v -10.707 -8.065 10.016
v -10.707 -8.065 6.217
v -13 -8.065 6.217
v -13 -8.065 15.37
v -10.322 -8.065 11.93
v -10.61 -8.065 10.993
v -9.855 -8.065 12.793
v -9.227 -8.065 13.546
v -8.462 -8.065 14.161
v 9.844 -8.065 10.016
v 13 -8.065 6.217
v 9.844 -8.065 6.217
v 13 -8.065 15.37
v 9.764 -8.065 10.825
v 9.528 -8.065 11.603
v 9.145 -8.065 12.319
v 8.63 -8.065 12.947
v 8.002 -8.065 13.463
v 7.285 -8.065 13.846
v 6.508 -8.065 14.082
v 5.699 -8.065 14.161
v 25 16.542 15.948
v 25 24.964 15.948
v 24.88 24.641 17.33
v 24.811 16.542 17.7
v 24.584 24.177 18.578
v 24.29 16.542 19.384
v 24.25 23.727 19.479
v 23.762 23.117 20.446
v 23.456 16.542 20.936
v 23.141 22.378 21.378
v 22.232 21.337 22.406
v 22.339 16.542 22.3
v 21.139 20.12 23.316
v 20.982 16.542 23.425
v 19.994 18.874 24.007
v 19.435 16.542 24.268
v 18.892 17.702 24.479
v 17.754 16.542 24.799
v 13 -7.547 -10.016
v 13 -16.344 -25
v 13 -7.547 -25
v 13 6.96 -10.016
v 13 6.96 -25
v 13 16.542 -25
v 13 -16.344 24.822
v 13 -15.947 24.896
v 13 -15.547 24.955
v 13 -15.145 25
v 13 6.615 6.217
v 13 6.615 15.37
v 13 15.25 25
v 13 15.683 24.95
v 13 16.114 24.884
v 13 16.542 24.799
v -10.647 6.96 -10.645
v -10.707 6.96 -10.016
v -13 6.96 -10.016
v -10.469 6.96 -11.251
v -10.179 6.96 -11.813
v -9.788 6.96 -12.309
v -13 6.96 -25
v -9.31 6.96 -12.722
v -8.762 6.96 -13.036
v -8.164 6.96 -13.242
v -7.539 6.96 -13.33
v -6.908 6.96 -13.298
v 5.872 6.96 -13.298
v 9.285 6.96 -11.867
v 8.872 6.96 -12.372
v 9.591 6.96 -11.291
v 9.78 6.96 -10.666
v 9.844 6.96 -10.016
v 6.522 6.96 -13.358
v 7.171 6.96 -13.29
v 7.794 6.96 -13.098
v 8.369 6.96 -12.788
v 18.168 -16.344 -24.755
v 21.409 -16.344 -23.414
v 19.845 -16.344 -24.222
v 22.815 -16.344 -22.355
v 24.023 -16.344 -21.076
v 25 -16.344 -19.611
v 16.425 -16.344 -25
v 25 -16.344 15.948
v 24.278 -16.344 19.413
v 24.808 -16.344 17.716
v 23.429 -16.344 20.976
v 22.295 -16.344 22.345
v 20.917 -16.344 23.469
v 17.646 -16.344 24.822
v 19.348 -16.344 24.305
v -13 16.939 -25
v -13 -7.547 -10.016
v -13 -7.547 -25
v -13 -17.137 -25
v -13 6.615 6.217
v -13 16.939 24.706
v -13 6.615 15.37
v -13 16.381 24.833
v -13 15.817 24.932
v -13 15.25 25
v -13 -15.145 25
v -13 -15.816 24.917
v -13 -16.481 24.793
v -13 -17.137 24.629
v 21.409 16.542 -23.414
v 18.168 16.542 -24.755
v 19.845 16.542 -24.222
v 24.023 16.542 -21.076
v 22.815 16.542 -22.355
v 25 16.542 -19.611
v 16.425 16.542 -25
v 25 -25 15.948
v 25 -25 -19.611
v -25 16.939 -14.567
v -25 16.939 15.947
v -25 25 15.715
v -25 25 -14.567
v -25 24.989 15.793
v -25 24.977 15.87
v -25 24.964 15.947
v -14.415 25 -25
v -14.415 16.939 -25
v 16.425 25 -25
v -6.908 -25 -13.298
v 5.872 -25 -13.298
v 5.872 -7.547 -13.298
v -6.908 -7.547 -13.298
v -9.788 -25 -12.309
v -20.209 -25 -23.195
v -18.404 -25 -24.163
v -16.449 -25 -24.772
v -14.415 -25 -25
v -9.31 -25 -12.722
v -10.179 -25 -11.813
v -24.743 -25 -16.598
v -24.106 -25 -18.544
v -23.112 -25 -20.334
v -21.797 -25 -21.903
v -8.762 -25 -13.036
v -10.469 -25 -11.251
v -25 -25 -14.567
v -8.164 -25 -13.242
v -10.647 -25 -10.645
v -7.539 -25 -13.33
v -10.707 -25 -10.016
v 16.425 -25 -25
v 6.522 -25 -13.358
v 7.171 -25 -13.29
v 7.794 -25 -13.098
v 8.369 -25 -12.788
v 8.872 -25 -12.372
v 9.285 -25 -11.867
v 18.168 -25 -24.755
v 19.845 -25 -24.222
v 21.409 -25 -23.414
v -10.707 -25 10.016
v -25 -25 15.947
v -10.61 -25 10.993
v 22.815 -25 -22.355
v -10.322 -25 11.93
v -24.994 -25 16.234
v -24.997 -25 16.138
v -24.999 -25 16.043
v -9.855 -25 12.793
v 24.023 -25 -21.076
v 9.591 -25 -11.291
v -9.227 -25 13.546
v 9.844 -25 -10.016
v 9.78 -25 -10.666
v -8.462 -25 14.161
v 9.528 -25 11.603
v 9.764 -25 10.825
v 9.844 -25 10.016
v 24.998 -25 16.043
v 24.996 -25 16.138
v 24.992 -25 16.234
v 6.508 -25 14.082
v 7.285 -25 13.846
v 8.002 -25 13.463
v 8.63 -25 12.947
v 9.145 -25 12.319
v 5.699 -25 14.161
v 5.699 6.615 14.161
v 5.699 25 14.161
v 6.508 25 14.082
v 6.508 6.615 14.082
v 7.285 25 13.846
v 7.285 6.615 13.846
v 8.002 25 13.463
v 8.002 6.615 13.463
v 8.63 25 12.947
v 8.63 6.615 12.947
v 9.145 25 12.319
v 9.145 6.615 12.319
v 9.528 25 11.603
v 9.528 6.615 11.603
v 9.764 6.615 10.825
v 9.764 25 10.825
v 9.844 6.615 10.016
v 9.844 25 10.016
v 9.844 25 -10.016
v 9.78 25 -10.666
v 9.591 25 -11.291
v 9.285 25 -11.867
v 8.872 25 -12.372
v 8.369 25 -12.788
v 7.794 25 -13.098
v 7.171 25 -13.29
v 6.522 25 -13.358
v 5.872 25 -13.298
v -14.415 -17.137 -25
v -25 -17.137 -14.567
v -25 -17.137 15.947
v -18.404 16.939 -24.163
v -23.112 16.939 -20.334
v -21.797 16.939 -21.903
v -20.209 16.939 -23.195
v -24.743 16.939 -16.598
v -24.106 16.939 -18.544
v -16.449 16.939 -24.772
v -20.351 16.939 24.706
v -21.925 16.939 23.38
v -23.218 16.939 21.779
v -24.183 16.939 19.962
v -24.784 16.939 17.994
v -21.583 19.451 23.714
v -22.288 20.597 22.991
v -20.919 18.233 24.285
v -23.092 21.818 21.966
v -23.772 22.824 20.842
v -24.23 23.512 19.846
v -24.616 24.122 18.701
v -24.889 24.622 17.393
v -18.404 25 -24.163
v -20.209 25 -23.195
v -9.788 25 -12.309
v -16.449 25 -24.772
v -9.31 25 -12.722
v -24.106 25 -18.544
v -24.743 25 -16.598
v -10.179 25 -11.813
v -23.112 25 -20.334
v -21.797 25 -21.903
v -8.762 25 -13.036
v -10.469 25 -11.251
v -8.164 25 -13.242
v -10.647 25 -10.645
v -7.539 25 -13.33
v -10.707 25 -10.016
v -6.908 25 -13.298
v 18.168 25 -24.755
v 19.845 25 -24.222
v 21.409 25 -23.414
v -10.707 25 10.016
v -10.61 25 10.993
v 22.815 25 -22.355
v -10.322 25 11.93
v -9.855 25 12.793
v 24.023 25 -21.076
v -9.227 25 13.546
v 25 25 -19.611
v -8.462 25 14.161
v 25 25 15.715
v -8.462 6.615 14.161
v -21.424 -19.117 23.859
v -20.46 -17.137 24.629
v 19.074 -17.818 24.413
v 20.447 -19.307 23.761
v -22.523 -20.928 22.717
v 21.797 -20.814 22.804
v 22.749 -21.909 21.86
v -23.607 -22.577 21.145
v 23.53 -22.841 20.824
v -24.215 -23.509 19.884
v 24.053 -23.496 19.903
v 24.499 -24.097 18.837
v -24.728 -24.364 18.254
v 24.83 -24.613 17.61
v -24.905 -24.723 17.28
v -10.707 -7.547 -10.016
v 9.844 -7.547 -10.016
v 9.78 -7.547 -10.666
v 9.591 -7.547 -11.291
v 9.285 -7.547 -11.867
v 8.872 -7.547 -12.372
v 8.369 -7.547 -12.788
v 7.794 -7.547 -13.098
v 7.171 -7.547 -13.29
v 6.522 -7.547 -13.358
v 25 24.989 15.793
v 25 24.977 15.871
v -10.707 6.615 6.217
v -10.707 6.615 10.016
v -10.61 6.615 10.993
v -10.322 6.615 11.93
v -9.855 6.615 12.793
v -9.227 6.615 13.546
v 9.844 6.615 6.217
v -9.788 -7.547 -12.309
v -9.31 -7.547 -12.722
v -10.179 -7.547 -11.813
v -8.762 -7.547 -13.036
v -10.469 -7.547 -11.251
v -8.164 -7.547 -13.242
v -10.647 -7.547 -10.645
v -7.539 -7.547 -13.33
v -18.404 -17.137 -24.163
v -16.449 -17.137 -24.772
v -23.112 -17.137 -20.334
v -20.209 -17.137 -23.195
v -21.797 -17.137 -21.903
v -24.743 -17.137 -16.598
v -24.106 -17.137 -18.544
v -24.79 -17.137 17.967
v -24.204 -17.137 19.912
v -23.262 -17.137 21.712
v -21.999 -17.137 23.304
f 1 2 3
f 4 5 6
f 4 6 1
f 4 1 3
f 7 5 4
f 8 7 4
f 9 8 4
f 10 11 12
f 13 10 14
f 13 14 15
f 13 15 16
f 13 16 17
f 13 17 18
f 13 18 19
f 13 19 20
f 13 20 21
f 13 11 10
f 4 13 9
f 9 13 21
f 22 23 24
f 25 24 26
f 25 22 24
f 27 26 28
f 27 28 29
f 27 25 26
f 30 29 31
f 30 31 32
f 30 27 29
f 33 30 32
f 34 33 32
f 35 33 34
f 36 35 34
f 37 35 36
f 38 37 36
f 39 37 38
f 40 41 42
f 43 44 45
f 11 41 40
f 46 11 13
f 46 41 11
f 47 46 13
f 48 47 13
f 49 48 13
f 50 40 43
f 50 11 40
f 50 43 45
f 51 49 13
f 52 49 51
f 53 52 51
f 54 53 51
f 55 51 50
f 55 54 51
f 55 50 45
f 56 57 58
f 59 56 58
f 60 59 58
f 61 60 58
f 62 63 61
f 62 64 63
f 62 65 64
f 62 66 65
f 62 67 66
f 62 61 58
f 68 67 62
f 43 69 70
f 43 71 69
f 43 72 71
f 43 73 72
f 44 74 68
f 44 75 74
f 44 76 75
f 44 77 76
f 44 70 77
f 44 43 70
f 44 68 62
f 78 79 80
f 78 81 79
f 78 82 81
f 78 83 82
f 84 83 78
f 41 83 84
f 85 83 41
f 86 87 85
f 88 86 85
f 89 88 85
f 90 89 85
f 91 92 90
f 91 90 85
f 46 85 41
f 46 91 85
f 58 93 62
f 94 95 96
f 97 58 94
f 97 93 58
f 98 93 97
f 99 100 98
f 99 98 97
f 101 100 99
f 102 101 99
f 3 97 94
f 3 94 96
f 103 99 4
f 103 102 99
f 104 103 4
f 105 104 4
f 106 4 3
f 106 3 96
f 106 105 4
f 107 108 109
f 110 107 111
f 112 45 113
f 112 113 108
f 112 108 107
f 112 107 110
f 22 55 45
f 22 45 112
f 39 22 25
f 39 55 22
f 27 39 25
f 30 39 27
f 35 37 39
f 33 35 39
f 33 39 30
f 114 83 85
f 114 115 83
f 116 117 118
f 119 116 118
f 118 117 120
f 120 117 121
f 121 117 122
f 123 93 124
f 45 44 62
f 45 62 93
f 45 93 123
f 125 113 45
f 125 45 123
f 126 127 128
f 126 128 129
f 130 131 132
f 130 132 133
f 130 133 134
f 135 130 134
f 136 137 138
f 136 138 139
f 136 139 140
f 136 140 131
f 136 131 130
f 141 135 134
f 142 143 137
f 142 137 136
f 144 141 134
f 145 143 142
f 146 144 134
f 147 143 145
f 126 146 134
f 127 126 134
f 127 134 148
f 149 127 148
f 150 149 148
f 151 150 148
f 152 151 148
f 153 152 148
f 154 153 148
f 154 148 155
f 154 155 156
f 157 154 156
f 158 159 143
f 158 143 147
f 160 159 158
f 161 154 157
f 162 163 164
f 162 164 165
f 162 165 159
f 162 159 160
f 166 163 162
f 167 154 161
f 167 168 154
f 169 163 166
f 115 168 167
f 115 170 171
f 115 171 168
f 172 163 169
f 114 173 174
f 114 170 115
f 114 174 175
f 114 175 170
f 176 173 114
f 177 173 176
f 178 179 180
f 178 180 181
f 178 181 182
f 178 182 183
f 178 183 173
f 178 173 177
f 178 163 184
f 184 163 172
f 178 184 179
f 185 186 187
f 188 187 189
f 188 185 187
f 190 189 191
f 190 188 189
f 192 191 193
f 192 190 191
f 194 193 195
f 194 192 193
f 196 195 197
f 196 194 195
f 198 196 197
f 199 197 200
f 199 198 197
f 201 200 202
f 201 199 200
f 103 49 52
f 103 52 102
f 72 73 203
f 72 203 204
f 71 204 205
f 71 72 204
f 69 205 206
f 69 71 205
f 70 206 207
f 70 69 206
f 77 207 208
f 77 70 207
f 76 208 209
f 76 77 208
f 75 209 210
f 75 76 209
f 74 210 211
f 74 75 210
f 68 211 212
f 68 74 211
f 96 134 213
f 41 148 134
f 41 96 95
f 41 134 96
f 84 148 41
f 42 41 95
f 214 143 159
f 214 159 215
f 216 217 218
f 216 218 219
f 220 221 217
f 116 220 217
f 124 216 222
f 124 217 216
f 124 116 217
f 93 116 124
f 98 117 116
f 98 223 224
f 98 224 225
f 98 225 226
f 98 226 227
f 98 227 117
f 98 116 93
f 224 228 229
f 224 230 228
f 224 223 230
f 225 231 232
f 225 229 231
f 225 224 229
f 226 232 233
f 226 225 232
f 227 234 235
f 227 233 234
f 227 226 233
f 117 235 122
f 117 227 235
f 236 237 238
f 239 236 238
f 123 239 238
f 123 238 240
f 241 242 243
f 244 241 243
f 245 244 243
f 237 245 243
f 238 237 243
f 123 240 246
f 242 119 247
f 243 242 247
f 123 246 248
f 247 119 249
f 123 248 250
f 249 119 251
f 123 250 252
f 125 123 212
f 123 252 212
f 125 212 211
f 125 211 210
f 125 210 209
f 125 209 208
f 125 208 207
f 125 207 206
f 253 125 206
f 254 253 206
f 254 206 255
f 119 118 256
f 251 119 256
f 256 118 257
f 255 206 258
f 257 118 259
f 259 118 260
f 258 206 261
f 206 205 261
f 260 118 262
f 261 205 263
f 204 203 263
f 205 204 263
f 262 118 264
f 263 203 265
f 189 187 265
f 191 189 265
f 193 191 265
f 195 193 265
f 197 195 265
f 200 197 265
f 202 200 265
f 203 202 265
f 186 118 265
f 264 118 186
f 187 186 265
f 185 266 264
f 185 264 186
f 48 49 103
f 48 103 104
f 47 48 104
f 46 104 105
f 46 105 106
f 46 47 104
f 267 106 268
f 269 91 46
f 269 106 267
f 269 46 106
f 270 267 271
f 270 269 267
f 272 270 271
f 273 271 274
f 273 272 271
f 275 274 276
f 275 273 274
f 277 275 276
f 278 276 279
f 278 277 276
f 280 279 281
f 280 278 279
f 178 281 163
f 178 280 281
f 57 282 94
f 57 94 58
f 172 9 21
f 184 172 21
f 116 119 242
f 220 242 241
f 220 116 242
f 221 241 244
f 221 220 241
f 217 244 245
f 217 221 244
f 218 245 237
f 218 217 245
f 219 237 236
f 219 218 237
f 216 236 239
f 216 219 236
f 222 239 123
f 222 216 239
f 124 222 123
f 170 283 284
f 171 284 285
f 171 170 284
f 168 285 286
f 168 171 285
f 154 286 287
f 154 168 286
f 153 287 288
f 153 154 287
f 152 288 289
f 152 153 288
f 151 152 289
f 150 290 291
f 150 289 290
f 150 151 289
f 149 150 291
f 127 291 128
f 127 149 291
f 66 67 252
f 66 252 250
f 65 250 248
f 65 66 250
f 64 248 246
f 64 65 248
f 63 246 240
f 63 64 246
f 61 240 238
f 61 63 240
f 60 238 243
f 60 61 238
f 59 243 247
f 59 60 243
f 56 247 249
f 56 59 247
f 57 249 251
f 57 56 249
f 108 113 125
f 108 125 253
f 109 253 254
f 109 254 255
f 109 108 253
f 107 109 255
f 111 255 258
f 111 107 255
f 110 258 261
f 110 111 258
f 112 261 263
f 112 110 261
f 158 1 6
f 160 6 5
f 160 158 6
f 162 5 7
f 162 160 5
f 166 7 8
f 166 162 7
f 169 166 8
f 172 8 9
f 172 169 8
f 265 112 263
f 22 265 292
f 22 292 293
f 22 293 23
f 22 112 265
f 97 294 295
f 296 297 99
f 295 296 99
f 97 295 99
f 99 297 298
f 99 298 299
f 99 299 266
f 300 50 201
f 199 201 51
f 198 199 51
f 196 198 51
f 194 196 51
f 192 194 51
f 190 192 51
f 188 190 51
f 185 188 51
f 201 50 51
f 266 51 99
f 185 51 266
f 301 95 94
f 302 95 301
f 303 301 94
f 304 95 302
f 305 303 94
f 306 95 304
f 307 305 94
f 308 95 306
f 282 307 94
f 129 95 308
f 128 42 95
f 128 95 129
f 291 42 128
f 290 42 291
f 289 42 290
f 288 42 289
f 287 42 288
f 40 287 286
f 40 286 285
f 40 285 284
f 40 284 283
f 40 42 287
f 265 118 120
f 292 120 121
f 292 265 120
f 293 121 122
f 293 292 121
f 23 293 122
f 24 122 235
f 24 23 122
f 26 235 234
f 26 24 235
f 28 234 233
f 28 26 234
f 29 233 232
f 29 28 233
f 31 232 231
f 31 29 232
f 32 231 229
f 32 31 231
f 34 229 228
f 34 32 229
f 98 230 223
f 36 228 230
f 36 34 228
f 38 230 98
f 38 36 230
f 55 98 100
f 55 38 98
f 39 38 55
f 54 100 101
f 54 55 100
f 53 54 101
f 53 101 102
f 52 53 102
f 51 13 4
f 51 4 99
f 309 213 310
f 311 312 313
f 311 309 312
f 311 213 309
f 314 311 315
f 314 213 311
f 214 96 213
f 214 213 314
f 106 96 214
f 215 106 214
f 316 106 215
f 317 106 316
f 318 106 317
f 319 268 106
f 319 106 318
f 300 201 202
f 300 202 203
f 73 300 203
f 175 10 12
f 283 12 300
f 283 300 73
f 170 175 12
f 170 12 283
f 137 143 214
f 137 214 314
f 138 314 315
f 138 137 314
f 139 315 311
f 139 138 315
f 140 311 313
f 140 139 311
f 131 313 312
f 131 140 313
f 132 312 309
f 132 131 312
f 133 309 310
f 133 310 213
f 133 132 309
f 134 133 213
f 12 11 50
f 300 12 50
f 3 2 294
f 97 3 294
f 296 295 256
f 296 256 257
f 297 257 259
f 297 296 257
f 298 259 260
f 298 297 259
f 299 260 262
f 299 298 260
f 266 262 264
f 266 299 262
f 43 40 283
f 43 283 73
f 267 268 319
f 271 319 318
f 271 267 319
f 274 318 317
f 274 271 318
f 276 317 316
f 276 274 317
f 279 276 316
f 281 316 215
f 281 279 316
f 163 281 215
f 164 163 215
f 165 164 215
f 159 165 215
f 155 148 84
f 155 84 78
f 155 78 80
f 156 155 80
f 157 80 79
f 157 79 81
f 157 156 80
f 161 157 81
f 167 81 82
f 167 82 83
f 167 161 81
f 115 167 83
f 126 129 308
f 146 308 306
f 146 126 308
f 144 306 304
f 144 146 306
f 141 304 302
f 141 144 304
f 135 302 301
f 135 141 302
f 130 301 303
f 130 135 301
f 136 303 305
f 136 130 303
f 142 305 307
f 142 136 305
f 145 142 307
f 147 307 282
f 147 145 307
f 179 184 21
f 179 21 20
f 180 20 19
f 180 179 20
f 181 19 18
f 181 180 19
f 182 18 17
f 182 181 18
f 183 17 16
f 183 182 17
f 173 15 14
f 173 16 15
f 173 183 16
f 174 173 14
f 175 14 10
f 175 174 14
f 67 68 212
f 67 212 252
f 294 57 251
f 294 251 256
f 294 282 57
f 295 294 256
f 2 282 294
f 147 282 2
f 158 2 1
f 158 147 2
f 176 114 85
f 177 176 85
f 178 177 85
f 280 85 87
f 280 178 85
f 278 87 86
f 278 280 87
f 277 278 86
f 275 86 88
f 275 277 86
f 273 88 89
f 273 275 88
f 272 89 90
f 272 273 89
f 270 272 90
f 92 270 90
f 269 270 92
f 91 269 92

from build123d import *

# Parameters (mm, degrees)
F3_DEPTH = 25
F2_W     = 14.679278
F2_H     = 9.152961
F4_DEPTH = 25
F5_DEPTH = 25


with BuildPart() as f3:
    # F1 (on Front) → F3 (new body, symmetric)
    with BuildSketch(Plane.XZ):
        with BuildLine():
            Line((15.849059, 25), (-19.900017, 25))
            ThreePointArc((-19.900017, 25), (-23.663126, 21.043852), (-25, 15.75))
            Line((-25, 15.75), (-25, -13.906561))
            Line((-25, -13.906561), (-25, -14.566518))
            ThreePointArc((-25, -14.566518), (-21.671652, -22.024724), (-14.065702, -25))
            Line((-14.065702, -25), (15.273589, -25))
            ThreePointArc((15.273589, -25), (20.913091, -23.706775), (25, -19.611218))
            Line((25, -19.611218), (25, -9.521818))
            Line((25, -9.521818), (25, 15.948113))
            ThreePointArc((25, 15.948113), (22.284826, 22.35471), (15.849059, 25))
        make_face()
        with BuildLine():
            Line((-10.707237, -10.016448), (-10.707237, 0))
            Line((-10.707237, 0), (-10.707237, 10.016448))
            ThreePointArc((-10.707237, 10.016448), (-10.10992, 12.373308), (-8.462171, 14.161184))
            Line((-8.462171, 14.161184), (4.317435, 14.161184))
            Line((4.317435, 14.161184), (5.699014, 14.161184))
            ThreePointArc((5.699014, 14.161184), (8.629785, 12.947219), (9.843749, 10.016448))
            Line((9.843749, 10.016448), (9.843749, 0))
            Line((9.843749, 0), (9.843749, -10.016448))
            ThreePointArc((9.843749, -10.016448), (8.630455, -12.592476), (5.871711, -13.297698))
            Line((5.871711, -13.297698), (-6.907895, -13.297698))
            ThreePointArc((-6.907895, -13.297698), (-9.558442, -12.526508), (-10.707237, -10.016448))
        make_face(mode=Mode.SUBTRACT)
    extrude(amount=F3_DEPTH, both=True)

    # F2 (on Right) → F4 (intersect, symmetric)
    with BuildSketch(Plane.YZ):
        with BuildLine():
            Line((-25, -25), (-7.54655, -25))
            Line((-7.54655, -25), (-7.54655, -10.016448))
            Line((-7.54655, -10.016448), (6.960031, -10.016448))
            Line((6.960031, -10.016448), (6.960031, -25))
            Line((6.960031, -25), (25, -25))
            Line((25, -25), (25, 15.715461))
            ThreePointArc((25, 15.715461), (21.733554, 22.047274), (15.249502, 25))
            Line((15.249502, 25), (-15.145234, 25))
            ThreePointArc((-15.145234, 25), (-21.510489, 22.233155), (-25, 16.233554))
            Line((-25, 16.233554), (-25, -25))
        make_face()
        with Locations((-0.725002, 10.793585)):
            Rectangle(F2_W, F2_H, mode=Mode.SUBTRACT)
    extrude(amount=F4_DEPTH, both=True, mode=Mode.INTERSECT)

    # F0 (on Top) → F5 (intersect, symmetric)
    with BuildSketch(Plane.XY):
        Polygon((25, 25), (-25, 25), (-25, 16.938681), (-13, 16.938681), (-13, -17.136794), (-25, -17.136794), (-25, -25), (25, -25), (25, -16.344341), (13, -16.344341), (13, 16.542453), (25, 16.542453), align=None)
    extrude(amount=F5_DEPTH, both=True, mode=Mode.INTERSECT)


solid = f3.part
